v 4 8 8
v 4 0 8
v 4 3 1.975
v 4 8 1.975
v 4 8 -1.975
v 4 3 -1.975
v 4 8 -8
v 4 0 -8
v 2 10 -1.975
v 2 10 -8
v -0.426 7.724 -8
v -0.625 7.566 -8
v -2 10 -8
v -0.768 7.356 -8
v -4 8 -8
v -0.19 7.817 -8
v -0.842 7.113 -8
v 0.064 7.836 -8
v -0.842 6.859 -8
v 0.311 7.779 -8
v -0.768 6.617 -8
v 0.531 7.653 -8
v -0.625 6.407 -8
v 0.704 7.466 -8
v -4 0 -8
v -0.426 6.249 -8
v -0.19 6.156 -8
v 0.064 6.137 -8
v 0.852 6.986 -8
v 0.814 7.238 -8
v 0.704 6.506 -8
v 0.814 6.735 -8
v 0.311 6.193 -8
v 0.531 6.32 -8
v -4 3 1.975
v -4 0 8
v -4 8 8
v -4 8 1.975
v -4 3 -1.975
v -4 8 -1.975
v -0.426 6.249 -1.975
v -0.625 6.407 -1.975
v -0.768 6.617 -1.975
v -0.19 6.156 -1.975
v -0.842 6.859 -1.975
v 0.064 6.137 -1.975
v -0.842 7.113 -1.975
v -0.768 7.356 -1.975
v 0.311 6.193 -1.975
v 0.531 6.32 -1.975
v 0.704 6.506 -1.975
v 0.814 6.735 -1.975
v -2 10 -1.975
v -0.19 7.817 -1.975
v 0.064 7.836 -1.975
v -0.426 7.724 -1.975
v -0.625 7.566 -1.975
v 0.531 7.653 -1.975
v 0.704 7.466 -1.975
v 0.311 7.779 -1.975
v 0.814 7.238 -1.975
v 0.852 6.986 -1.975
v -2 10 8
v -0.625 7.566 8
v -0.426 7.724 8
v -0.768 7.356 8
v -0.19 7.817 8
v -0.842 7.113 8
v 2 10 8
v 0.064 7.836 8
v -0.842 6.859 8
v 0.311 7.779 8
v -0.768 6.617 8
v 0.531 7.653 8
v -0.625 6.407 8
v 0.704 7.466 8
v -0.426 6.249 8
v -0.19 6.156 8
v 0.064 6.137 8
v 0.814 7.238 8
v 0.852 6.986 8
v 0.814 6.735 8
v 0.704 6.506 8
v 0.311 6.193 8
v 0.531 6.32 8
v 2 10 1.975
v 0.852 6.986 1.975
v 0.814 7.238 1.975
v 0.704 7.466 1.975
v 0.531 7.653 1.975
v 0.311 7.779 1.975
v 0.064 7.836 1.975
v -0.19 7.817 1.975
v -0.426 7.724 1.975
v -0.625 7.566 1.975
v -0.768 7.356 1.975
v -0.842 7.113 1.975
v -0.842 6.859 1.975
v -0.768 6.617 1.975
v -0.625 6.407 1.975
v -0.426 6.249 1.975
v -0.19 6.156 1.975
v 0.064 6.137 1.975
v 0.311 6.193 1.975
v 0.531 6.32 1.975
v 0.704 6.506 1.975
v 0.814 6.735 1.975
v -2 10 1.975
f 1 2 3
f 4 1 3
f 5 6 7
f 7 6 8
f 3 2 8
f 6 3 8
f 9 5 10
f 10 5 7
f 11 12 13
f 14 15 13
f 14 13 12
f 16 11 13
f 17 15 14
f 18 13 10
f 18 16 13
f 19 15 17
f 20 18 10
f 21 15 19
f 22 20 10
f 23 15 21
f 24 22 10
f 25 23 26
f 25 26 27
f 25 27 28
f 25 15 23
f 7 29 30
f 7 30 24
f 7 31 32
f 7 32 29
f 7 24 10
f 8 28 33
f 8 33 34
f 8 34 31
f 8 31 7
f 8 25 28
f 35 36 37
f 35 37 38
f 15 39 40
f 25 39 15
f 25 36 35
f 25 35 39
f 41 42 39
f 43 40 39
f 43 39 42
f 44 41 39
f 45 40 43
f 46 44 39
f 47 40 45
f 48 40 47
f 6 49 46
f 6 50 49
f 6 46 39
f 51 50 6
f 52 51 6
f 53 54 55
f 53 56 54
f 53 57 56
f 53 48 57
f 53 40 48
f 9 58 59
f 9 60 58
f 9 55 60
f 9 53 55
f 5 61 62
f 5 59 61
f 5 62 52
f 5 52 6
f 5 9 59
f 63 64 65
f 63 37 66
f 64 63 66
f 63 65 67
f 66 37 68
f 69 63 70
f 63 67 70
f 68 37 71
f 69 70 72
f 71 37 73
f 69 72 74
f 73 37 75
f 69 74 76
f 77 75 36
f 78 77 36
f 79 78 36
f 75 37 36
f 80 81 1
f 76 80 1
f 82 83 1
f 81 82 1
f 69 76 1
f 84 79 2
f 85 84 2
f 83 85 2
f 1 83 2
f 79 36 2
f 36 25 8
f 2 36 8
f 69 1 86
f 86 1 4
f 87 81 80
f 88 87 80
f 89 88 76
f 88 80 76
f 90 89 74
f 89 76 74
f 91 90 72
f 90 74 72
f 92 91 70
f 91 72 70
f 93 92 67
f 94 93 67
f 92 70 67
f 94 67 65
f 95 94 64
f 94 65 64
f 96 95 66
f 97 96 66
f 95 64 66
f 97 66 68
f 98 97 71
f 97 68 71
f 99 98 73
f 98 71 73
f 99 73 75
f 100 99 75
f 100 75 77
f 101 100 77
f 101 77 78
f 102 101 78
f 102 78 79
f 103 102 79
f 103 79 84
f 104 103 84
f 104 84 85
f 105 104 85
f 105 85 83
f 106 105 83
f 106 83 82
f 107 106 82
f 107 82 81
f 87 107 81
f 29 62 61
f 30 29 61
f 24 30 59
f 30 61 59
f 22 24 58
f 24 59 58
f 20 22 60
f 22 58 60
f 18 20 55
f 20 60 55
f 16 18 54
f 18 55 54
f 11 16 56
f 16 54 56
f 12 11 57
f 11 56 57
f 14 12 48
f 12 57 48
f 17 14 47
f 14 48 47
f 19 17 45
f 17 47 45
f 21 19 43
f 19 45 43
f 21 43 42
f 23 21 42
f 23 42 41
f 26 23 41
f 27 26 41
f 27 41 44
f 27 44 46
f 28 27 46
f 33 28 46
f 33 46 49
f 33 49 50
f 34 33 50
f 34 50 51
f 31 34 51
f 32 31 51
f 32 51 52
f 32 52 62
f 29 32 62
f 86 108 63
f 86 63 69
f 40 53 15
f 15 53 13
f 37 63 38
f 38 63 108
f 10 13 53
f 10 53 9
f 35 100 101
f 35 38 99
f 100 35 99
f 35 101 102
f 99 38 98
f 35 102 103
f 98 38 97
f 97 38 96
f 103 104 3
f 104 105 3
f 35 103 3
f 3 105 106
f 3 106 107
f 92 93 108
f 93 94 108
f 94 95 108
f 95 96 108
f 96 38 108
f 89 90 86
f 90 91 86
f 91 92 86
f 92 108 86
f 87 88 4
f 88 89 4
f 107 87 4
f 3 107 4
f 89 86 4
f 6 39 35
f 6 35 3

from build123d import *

# Parameters (mm, degrees)
SKETCH_1_W          = 8
SKETCH_1_H          = 16
EXTRUDE_1_DEPTH     = 10
SKETCH_2_R          = 0.852
CUT_EXTRUDE_1_DEPTH = 20.287301522
SKETCH_3_W          = 11.235534132
SKETCH_3_H          = 3.949082568
CUT_EXTRUDE_2_DEPTH = 7
CHAMFER_1_SIZE      = 2


with BuildPart() as part:
    # Эскиз1 → Вытянуть1 (new body)
    with BuildSketch(Plane(origin=(0, 0, 0), x_dir=(1, 0, 0), z_dir=(0, 1, 0))):
        Rectangle(SKETCH_1_W, SKETCH_1_H)
    extrude(amount=EXTRUDE_1_DEPTH)

    # Эскиз2 → Вырез-Вытянуть1 (cut, through all)
    with BuildSketch(Plane.XY.offset(8)):
        with Locations((0, 6.986387237)):
            Circle(SKETCH_2_R)
    extrude(amount=-CUT_EXTRUDE_1_DEPTH, mode=Mode.SUBTRACT)

    # Эскиз3 → Вырез-Вытянуть2 (cut)
    with BuildSketch(Plane(origin=(0, 10, 0), x_dir=(1, 0, 0), z_dir=(0, 1, 0))):
        Rectangle(SKETCH_3_W, SKETCH_3_H)
    extrude(amount=-CUT_EXTRUDE_2_DEPTH, mode=Mode.SUBTRACT)

    # Фаска1
    chamfer_1_edges = [part.edges().sort_by_distance(p)[0] for p in [
        (-4, 10, -4.987270642),
        (4, 10, -4.987270642),
        (-4, 10, 4.987270642),
        (4, 10, 4.987270642),
    ]]
    chamfer(chamfer_1_edges, length=CHAMFER_1_SIZE)


solid = part.part
